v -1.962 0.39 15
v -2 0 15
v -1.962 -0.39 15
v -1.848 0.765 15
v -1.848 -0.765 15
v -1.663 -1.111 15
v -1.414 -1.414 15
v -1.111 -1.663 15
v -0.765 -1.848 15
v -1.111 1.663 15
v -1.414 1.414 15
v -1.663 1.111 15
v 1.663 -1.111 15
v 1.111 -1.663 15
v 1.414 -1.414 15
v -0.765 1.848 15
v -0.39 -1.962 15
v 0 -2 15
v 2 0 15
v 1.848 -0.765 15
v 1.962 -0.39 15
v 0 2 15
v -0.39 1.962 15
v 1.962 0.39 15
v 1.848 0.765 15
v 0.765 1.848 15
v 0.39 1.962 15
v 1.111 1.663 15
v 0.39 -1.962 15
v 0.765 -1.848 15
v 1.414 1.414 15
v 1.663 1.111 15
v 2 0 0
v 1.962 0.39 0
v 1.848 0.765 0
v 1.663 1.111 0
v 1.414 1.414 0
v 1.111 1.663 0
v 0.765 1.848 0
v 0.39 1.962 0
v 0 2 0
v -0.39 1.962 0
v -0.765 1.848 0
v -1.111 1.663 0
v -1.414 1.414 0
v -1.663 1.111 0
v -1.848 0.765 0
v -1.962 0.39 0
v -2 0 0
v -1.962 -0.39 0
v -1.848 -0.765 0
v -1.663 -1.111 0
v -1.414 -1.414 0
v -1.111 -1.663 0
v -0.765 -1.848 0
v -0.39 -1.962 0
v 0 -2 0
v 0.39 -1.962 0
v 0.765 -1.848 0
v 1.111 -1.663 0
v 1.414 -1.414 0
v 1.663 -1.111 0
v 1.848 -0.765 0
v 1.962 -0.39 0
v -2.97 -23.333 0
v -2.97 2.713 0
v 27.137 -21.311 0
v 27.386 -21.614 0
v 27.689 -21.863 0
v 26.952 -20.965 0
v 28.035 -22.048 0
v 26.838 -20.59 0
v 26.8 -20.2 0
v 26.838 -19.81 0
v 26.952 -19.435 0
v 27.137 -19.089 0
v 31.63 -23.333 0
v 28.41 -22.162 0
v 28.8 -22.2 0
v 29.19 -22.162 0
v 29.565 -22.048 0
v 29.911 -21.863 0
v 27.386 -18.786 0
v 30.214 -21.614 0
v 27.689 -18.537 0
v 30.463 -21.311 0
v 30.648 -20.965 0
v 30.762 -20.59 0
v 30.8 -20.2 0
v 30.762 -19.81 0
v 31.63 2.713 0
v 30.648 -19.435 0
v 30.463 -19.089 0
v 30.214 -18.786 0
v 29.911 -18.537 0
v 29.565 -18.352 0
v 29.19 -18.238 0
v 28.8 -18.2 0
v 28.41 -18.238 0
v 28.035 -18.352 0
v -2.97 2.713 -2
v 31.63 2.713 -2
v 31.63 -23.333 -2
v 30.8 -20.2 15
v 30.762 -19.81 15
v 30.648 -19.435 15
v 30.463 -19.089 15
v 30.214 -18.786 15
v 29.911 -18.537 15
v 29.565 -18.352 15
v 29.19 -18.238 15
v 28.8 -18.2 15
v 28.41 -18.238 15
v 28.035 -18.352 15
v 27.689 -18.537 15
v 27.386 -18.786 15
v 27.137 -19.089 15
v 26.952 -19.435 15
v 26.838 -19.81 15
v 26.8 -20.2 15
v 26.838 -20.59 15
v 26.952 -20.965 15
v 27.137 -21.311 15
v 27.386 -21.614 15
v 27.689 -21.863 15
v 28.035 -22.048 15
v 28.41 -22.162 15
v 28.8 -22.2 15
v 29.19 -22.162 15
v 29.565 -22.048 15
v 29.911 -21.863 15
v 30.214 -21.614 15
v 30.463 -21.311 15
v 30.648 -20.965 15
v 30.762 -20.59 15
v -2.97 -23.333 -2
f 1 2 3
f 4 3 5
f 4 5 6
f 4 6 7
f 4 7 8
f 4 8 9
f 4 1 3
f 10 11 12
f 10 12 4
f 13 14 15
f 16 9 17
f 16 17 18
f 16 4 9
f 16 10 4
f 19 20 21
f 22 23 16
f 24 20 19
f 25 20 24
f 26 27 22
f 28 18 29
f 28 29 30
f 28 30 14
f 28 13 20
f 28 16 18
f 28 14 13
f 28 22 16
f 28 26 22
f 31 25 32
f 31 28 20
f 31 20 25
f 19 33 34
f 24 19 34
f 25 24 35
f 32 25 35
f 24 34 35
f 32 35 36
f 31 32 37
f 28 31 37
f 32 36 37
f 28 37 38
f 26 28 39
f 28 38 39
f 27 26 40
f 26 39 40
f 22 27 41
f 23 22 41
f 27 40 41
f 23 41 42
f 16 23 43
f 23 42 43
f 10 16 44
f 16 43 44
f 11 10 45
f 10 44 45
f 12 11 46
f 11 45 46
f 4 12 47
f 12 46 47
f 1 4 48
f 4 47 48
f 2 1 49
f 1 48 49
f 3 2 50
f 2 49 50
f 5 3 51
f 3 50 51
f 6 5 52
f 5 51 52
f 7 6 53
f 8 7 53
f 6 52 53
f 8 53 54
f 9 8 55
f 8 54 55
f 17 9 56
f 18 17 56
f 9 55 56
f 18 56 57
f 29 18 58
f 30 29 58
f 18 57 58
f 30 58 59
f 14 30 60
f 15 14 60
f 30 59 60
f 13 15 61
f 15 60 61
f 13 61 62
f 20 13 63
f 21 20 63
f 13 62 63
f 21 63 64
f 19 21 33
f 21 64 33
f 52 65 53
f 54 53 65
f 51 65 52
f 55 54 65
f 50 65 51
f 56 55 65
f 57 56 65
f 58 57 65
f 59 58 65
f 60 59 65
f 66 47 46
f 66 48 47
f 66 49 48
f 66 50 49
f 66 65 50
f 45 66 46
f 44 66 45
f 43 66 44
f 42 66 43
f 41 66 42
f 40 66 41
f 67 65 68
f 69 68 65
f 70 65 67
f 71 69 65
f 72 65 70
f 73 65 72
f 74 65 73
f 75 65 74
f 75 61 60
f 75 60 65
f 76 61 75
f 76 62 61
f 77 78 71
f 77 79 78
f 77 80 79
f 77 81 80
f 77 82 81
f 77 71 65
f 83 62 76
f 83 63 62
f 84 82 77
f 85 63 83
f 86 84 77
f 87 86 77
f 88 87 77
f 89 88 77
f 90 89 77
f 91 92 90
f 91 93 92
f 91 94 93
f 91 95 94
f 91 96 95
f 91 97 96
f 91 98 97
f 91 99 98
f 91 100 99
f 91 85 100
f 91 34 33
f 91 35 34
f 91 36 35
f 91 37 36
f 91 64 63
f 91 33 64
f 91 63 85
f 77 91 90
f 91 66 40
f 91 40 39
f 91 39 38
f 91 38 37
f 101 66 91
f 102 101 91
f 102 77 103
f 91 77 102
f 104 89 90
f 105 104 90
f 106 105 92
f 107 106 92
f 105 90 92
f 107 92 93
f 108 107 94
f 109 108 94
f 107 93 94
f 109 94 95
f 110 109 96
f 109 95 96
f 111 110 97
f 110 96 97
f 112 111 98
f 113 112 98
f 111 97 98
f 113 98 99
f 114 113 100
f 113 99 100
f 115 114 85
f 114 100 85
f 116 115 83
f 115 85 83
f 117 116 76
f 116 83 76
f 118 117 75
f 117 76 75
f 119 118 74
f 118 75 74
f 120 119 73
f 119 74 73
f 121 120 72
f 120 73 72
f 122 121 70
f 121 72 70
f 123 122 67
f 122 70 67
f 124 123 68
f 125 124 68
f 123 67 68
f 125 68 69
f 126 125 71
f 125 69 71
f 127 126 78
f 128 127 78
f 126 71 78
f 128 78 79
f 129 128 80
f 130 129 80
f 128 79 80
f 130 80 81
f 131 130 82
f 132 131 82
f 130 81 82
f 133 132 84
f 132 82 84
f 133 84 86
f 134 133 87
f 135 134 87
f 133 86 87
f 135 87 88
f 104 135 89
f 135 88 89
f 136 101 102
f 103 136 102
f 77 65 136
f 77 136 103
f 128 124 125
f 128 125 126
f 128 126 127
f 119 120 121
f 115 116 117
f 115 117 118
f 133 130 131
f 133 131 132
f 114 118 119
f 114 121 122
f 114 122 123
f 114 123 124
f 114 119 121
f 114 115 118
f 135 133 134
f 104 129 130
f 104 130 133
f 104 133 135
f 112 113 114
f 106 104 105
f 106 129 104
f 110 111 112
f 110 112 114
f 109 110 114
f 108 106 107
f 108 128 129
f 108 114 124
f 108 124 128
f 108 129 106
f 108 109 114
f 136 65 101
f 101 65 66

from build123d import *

# Parameters (mm, degrees)
SKETCH1_R             = 2
BOSS_EXTRUDE1_DEPTH   = 15
BOSS_EXTRUDE1_2_DEPTH = 15
SKETCH2_W             = 34.599574116
SKETCH2_H             = 26.046082642
BOSS_EXTRUDE2_DEPTH   = 2


with BuildPart() as part:
    # Sketch1 → Boss-Extrude1 (new body)
    with BuildSketch(Plane.XY):
        Circle(SKETCH1_R)
    extrude(amount=BOSS_EXTRUDE1_DEPTH)



with BuildPart() as body_2:
    # Sketch1 → Boss-Extrude1 2 (new body)
    with BuildSketch(Plane.XY):
        with Locations((28.8, -20.2)):
            Circle(SKETCH1_R)
    extrude(amount=BOSS_EXTRUDE1_2_DEPTH)


with BuildPart() as part_1:
    add(part.part)

    add(body_2.part)  # Boss-Extrude2 merges body 2
    # Sketch2 → Boss-Extrude2 (add)
    with BuildSketch(Plane.XY):
        with Locations((14.329889414, -10.310331758)):
            Rectangle(SKETCH2_W, SKETCH2_H)
    extrude(amount=-BOSS_EXTRUDE2_DEPTH)


solid = part_1.part
